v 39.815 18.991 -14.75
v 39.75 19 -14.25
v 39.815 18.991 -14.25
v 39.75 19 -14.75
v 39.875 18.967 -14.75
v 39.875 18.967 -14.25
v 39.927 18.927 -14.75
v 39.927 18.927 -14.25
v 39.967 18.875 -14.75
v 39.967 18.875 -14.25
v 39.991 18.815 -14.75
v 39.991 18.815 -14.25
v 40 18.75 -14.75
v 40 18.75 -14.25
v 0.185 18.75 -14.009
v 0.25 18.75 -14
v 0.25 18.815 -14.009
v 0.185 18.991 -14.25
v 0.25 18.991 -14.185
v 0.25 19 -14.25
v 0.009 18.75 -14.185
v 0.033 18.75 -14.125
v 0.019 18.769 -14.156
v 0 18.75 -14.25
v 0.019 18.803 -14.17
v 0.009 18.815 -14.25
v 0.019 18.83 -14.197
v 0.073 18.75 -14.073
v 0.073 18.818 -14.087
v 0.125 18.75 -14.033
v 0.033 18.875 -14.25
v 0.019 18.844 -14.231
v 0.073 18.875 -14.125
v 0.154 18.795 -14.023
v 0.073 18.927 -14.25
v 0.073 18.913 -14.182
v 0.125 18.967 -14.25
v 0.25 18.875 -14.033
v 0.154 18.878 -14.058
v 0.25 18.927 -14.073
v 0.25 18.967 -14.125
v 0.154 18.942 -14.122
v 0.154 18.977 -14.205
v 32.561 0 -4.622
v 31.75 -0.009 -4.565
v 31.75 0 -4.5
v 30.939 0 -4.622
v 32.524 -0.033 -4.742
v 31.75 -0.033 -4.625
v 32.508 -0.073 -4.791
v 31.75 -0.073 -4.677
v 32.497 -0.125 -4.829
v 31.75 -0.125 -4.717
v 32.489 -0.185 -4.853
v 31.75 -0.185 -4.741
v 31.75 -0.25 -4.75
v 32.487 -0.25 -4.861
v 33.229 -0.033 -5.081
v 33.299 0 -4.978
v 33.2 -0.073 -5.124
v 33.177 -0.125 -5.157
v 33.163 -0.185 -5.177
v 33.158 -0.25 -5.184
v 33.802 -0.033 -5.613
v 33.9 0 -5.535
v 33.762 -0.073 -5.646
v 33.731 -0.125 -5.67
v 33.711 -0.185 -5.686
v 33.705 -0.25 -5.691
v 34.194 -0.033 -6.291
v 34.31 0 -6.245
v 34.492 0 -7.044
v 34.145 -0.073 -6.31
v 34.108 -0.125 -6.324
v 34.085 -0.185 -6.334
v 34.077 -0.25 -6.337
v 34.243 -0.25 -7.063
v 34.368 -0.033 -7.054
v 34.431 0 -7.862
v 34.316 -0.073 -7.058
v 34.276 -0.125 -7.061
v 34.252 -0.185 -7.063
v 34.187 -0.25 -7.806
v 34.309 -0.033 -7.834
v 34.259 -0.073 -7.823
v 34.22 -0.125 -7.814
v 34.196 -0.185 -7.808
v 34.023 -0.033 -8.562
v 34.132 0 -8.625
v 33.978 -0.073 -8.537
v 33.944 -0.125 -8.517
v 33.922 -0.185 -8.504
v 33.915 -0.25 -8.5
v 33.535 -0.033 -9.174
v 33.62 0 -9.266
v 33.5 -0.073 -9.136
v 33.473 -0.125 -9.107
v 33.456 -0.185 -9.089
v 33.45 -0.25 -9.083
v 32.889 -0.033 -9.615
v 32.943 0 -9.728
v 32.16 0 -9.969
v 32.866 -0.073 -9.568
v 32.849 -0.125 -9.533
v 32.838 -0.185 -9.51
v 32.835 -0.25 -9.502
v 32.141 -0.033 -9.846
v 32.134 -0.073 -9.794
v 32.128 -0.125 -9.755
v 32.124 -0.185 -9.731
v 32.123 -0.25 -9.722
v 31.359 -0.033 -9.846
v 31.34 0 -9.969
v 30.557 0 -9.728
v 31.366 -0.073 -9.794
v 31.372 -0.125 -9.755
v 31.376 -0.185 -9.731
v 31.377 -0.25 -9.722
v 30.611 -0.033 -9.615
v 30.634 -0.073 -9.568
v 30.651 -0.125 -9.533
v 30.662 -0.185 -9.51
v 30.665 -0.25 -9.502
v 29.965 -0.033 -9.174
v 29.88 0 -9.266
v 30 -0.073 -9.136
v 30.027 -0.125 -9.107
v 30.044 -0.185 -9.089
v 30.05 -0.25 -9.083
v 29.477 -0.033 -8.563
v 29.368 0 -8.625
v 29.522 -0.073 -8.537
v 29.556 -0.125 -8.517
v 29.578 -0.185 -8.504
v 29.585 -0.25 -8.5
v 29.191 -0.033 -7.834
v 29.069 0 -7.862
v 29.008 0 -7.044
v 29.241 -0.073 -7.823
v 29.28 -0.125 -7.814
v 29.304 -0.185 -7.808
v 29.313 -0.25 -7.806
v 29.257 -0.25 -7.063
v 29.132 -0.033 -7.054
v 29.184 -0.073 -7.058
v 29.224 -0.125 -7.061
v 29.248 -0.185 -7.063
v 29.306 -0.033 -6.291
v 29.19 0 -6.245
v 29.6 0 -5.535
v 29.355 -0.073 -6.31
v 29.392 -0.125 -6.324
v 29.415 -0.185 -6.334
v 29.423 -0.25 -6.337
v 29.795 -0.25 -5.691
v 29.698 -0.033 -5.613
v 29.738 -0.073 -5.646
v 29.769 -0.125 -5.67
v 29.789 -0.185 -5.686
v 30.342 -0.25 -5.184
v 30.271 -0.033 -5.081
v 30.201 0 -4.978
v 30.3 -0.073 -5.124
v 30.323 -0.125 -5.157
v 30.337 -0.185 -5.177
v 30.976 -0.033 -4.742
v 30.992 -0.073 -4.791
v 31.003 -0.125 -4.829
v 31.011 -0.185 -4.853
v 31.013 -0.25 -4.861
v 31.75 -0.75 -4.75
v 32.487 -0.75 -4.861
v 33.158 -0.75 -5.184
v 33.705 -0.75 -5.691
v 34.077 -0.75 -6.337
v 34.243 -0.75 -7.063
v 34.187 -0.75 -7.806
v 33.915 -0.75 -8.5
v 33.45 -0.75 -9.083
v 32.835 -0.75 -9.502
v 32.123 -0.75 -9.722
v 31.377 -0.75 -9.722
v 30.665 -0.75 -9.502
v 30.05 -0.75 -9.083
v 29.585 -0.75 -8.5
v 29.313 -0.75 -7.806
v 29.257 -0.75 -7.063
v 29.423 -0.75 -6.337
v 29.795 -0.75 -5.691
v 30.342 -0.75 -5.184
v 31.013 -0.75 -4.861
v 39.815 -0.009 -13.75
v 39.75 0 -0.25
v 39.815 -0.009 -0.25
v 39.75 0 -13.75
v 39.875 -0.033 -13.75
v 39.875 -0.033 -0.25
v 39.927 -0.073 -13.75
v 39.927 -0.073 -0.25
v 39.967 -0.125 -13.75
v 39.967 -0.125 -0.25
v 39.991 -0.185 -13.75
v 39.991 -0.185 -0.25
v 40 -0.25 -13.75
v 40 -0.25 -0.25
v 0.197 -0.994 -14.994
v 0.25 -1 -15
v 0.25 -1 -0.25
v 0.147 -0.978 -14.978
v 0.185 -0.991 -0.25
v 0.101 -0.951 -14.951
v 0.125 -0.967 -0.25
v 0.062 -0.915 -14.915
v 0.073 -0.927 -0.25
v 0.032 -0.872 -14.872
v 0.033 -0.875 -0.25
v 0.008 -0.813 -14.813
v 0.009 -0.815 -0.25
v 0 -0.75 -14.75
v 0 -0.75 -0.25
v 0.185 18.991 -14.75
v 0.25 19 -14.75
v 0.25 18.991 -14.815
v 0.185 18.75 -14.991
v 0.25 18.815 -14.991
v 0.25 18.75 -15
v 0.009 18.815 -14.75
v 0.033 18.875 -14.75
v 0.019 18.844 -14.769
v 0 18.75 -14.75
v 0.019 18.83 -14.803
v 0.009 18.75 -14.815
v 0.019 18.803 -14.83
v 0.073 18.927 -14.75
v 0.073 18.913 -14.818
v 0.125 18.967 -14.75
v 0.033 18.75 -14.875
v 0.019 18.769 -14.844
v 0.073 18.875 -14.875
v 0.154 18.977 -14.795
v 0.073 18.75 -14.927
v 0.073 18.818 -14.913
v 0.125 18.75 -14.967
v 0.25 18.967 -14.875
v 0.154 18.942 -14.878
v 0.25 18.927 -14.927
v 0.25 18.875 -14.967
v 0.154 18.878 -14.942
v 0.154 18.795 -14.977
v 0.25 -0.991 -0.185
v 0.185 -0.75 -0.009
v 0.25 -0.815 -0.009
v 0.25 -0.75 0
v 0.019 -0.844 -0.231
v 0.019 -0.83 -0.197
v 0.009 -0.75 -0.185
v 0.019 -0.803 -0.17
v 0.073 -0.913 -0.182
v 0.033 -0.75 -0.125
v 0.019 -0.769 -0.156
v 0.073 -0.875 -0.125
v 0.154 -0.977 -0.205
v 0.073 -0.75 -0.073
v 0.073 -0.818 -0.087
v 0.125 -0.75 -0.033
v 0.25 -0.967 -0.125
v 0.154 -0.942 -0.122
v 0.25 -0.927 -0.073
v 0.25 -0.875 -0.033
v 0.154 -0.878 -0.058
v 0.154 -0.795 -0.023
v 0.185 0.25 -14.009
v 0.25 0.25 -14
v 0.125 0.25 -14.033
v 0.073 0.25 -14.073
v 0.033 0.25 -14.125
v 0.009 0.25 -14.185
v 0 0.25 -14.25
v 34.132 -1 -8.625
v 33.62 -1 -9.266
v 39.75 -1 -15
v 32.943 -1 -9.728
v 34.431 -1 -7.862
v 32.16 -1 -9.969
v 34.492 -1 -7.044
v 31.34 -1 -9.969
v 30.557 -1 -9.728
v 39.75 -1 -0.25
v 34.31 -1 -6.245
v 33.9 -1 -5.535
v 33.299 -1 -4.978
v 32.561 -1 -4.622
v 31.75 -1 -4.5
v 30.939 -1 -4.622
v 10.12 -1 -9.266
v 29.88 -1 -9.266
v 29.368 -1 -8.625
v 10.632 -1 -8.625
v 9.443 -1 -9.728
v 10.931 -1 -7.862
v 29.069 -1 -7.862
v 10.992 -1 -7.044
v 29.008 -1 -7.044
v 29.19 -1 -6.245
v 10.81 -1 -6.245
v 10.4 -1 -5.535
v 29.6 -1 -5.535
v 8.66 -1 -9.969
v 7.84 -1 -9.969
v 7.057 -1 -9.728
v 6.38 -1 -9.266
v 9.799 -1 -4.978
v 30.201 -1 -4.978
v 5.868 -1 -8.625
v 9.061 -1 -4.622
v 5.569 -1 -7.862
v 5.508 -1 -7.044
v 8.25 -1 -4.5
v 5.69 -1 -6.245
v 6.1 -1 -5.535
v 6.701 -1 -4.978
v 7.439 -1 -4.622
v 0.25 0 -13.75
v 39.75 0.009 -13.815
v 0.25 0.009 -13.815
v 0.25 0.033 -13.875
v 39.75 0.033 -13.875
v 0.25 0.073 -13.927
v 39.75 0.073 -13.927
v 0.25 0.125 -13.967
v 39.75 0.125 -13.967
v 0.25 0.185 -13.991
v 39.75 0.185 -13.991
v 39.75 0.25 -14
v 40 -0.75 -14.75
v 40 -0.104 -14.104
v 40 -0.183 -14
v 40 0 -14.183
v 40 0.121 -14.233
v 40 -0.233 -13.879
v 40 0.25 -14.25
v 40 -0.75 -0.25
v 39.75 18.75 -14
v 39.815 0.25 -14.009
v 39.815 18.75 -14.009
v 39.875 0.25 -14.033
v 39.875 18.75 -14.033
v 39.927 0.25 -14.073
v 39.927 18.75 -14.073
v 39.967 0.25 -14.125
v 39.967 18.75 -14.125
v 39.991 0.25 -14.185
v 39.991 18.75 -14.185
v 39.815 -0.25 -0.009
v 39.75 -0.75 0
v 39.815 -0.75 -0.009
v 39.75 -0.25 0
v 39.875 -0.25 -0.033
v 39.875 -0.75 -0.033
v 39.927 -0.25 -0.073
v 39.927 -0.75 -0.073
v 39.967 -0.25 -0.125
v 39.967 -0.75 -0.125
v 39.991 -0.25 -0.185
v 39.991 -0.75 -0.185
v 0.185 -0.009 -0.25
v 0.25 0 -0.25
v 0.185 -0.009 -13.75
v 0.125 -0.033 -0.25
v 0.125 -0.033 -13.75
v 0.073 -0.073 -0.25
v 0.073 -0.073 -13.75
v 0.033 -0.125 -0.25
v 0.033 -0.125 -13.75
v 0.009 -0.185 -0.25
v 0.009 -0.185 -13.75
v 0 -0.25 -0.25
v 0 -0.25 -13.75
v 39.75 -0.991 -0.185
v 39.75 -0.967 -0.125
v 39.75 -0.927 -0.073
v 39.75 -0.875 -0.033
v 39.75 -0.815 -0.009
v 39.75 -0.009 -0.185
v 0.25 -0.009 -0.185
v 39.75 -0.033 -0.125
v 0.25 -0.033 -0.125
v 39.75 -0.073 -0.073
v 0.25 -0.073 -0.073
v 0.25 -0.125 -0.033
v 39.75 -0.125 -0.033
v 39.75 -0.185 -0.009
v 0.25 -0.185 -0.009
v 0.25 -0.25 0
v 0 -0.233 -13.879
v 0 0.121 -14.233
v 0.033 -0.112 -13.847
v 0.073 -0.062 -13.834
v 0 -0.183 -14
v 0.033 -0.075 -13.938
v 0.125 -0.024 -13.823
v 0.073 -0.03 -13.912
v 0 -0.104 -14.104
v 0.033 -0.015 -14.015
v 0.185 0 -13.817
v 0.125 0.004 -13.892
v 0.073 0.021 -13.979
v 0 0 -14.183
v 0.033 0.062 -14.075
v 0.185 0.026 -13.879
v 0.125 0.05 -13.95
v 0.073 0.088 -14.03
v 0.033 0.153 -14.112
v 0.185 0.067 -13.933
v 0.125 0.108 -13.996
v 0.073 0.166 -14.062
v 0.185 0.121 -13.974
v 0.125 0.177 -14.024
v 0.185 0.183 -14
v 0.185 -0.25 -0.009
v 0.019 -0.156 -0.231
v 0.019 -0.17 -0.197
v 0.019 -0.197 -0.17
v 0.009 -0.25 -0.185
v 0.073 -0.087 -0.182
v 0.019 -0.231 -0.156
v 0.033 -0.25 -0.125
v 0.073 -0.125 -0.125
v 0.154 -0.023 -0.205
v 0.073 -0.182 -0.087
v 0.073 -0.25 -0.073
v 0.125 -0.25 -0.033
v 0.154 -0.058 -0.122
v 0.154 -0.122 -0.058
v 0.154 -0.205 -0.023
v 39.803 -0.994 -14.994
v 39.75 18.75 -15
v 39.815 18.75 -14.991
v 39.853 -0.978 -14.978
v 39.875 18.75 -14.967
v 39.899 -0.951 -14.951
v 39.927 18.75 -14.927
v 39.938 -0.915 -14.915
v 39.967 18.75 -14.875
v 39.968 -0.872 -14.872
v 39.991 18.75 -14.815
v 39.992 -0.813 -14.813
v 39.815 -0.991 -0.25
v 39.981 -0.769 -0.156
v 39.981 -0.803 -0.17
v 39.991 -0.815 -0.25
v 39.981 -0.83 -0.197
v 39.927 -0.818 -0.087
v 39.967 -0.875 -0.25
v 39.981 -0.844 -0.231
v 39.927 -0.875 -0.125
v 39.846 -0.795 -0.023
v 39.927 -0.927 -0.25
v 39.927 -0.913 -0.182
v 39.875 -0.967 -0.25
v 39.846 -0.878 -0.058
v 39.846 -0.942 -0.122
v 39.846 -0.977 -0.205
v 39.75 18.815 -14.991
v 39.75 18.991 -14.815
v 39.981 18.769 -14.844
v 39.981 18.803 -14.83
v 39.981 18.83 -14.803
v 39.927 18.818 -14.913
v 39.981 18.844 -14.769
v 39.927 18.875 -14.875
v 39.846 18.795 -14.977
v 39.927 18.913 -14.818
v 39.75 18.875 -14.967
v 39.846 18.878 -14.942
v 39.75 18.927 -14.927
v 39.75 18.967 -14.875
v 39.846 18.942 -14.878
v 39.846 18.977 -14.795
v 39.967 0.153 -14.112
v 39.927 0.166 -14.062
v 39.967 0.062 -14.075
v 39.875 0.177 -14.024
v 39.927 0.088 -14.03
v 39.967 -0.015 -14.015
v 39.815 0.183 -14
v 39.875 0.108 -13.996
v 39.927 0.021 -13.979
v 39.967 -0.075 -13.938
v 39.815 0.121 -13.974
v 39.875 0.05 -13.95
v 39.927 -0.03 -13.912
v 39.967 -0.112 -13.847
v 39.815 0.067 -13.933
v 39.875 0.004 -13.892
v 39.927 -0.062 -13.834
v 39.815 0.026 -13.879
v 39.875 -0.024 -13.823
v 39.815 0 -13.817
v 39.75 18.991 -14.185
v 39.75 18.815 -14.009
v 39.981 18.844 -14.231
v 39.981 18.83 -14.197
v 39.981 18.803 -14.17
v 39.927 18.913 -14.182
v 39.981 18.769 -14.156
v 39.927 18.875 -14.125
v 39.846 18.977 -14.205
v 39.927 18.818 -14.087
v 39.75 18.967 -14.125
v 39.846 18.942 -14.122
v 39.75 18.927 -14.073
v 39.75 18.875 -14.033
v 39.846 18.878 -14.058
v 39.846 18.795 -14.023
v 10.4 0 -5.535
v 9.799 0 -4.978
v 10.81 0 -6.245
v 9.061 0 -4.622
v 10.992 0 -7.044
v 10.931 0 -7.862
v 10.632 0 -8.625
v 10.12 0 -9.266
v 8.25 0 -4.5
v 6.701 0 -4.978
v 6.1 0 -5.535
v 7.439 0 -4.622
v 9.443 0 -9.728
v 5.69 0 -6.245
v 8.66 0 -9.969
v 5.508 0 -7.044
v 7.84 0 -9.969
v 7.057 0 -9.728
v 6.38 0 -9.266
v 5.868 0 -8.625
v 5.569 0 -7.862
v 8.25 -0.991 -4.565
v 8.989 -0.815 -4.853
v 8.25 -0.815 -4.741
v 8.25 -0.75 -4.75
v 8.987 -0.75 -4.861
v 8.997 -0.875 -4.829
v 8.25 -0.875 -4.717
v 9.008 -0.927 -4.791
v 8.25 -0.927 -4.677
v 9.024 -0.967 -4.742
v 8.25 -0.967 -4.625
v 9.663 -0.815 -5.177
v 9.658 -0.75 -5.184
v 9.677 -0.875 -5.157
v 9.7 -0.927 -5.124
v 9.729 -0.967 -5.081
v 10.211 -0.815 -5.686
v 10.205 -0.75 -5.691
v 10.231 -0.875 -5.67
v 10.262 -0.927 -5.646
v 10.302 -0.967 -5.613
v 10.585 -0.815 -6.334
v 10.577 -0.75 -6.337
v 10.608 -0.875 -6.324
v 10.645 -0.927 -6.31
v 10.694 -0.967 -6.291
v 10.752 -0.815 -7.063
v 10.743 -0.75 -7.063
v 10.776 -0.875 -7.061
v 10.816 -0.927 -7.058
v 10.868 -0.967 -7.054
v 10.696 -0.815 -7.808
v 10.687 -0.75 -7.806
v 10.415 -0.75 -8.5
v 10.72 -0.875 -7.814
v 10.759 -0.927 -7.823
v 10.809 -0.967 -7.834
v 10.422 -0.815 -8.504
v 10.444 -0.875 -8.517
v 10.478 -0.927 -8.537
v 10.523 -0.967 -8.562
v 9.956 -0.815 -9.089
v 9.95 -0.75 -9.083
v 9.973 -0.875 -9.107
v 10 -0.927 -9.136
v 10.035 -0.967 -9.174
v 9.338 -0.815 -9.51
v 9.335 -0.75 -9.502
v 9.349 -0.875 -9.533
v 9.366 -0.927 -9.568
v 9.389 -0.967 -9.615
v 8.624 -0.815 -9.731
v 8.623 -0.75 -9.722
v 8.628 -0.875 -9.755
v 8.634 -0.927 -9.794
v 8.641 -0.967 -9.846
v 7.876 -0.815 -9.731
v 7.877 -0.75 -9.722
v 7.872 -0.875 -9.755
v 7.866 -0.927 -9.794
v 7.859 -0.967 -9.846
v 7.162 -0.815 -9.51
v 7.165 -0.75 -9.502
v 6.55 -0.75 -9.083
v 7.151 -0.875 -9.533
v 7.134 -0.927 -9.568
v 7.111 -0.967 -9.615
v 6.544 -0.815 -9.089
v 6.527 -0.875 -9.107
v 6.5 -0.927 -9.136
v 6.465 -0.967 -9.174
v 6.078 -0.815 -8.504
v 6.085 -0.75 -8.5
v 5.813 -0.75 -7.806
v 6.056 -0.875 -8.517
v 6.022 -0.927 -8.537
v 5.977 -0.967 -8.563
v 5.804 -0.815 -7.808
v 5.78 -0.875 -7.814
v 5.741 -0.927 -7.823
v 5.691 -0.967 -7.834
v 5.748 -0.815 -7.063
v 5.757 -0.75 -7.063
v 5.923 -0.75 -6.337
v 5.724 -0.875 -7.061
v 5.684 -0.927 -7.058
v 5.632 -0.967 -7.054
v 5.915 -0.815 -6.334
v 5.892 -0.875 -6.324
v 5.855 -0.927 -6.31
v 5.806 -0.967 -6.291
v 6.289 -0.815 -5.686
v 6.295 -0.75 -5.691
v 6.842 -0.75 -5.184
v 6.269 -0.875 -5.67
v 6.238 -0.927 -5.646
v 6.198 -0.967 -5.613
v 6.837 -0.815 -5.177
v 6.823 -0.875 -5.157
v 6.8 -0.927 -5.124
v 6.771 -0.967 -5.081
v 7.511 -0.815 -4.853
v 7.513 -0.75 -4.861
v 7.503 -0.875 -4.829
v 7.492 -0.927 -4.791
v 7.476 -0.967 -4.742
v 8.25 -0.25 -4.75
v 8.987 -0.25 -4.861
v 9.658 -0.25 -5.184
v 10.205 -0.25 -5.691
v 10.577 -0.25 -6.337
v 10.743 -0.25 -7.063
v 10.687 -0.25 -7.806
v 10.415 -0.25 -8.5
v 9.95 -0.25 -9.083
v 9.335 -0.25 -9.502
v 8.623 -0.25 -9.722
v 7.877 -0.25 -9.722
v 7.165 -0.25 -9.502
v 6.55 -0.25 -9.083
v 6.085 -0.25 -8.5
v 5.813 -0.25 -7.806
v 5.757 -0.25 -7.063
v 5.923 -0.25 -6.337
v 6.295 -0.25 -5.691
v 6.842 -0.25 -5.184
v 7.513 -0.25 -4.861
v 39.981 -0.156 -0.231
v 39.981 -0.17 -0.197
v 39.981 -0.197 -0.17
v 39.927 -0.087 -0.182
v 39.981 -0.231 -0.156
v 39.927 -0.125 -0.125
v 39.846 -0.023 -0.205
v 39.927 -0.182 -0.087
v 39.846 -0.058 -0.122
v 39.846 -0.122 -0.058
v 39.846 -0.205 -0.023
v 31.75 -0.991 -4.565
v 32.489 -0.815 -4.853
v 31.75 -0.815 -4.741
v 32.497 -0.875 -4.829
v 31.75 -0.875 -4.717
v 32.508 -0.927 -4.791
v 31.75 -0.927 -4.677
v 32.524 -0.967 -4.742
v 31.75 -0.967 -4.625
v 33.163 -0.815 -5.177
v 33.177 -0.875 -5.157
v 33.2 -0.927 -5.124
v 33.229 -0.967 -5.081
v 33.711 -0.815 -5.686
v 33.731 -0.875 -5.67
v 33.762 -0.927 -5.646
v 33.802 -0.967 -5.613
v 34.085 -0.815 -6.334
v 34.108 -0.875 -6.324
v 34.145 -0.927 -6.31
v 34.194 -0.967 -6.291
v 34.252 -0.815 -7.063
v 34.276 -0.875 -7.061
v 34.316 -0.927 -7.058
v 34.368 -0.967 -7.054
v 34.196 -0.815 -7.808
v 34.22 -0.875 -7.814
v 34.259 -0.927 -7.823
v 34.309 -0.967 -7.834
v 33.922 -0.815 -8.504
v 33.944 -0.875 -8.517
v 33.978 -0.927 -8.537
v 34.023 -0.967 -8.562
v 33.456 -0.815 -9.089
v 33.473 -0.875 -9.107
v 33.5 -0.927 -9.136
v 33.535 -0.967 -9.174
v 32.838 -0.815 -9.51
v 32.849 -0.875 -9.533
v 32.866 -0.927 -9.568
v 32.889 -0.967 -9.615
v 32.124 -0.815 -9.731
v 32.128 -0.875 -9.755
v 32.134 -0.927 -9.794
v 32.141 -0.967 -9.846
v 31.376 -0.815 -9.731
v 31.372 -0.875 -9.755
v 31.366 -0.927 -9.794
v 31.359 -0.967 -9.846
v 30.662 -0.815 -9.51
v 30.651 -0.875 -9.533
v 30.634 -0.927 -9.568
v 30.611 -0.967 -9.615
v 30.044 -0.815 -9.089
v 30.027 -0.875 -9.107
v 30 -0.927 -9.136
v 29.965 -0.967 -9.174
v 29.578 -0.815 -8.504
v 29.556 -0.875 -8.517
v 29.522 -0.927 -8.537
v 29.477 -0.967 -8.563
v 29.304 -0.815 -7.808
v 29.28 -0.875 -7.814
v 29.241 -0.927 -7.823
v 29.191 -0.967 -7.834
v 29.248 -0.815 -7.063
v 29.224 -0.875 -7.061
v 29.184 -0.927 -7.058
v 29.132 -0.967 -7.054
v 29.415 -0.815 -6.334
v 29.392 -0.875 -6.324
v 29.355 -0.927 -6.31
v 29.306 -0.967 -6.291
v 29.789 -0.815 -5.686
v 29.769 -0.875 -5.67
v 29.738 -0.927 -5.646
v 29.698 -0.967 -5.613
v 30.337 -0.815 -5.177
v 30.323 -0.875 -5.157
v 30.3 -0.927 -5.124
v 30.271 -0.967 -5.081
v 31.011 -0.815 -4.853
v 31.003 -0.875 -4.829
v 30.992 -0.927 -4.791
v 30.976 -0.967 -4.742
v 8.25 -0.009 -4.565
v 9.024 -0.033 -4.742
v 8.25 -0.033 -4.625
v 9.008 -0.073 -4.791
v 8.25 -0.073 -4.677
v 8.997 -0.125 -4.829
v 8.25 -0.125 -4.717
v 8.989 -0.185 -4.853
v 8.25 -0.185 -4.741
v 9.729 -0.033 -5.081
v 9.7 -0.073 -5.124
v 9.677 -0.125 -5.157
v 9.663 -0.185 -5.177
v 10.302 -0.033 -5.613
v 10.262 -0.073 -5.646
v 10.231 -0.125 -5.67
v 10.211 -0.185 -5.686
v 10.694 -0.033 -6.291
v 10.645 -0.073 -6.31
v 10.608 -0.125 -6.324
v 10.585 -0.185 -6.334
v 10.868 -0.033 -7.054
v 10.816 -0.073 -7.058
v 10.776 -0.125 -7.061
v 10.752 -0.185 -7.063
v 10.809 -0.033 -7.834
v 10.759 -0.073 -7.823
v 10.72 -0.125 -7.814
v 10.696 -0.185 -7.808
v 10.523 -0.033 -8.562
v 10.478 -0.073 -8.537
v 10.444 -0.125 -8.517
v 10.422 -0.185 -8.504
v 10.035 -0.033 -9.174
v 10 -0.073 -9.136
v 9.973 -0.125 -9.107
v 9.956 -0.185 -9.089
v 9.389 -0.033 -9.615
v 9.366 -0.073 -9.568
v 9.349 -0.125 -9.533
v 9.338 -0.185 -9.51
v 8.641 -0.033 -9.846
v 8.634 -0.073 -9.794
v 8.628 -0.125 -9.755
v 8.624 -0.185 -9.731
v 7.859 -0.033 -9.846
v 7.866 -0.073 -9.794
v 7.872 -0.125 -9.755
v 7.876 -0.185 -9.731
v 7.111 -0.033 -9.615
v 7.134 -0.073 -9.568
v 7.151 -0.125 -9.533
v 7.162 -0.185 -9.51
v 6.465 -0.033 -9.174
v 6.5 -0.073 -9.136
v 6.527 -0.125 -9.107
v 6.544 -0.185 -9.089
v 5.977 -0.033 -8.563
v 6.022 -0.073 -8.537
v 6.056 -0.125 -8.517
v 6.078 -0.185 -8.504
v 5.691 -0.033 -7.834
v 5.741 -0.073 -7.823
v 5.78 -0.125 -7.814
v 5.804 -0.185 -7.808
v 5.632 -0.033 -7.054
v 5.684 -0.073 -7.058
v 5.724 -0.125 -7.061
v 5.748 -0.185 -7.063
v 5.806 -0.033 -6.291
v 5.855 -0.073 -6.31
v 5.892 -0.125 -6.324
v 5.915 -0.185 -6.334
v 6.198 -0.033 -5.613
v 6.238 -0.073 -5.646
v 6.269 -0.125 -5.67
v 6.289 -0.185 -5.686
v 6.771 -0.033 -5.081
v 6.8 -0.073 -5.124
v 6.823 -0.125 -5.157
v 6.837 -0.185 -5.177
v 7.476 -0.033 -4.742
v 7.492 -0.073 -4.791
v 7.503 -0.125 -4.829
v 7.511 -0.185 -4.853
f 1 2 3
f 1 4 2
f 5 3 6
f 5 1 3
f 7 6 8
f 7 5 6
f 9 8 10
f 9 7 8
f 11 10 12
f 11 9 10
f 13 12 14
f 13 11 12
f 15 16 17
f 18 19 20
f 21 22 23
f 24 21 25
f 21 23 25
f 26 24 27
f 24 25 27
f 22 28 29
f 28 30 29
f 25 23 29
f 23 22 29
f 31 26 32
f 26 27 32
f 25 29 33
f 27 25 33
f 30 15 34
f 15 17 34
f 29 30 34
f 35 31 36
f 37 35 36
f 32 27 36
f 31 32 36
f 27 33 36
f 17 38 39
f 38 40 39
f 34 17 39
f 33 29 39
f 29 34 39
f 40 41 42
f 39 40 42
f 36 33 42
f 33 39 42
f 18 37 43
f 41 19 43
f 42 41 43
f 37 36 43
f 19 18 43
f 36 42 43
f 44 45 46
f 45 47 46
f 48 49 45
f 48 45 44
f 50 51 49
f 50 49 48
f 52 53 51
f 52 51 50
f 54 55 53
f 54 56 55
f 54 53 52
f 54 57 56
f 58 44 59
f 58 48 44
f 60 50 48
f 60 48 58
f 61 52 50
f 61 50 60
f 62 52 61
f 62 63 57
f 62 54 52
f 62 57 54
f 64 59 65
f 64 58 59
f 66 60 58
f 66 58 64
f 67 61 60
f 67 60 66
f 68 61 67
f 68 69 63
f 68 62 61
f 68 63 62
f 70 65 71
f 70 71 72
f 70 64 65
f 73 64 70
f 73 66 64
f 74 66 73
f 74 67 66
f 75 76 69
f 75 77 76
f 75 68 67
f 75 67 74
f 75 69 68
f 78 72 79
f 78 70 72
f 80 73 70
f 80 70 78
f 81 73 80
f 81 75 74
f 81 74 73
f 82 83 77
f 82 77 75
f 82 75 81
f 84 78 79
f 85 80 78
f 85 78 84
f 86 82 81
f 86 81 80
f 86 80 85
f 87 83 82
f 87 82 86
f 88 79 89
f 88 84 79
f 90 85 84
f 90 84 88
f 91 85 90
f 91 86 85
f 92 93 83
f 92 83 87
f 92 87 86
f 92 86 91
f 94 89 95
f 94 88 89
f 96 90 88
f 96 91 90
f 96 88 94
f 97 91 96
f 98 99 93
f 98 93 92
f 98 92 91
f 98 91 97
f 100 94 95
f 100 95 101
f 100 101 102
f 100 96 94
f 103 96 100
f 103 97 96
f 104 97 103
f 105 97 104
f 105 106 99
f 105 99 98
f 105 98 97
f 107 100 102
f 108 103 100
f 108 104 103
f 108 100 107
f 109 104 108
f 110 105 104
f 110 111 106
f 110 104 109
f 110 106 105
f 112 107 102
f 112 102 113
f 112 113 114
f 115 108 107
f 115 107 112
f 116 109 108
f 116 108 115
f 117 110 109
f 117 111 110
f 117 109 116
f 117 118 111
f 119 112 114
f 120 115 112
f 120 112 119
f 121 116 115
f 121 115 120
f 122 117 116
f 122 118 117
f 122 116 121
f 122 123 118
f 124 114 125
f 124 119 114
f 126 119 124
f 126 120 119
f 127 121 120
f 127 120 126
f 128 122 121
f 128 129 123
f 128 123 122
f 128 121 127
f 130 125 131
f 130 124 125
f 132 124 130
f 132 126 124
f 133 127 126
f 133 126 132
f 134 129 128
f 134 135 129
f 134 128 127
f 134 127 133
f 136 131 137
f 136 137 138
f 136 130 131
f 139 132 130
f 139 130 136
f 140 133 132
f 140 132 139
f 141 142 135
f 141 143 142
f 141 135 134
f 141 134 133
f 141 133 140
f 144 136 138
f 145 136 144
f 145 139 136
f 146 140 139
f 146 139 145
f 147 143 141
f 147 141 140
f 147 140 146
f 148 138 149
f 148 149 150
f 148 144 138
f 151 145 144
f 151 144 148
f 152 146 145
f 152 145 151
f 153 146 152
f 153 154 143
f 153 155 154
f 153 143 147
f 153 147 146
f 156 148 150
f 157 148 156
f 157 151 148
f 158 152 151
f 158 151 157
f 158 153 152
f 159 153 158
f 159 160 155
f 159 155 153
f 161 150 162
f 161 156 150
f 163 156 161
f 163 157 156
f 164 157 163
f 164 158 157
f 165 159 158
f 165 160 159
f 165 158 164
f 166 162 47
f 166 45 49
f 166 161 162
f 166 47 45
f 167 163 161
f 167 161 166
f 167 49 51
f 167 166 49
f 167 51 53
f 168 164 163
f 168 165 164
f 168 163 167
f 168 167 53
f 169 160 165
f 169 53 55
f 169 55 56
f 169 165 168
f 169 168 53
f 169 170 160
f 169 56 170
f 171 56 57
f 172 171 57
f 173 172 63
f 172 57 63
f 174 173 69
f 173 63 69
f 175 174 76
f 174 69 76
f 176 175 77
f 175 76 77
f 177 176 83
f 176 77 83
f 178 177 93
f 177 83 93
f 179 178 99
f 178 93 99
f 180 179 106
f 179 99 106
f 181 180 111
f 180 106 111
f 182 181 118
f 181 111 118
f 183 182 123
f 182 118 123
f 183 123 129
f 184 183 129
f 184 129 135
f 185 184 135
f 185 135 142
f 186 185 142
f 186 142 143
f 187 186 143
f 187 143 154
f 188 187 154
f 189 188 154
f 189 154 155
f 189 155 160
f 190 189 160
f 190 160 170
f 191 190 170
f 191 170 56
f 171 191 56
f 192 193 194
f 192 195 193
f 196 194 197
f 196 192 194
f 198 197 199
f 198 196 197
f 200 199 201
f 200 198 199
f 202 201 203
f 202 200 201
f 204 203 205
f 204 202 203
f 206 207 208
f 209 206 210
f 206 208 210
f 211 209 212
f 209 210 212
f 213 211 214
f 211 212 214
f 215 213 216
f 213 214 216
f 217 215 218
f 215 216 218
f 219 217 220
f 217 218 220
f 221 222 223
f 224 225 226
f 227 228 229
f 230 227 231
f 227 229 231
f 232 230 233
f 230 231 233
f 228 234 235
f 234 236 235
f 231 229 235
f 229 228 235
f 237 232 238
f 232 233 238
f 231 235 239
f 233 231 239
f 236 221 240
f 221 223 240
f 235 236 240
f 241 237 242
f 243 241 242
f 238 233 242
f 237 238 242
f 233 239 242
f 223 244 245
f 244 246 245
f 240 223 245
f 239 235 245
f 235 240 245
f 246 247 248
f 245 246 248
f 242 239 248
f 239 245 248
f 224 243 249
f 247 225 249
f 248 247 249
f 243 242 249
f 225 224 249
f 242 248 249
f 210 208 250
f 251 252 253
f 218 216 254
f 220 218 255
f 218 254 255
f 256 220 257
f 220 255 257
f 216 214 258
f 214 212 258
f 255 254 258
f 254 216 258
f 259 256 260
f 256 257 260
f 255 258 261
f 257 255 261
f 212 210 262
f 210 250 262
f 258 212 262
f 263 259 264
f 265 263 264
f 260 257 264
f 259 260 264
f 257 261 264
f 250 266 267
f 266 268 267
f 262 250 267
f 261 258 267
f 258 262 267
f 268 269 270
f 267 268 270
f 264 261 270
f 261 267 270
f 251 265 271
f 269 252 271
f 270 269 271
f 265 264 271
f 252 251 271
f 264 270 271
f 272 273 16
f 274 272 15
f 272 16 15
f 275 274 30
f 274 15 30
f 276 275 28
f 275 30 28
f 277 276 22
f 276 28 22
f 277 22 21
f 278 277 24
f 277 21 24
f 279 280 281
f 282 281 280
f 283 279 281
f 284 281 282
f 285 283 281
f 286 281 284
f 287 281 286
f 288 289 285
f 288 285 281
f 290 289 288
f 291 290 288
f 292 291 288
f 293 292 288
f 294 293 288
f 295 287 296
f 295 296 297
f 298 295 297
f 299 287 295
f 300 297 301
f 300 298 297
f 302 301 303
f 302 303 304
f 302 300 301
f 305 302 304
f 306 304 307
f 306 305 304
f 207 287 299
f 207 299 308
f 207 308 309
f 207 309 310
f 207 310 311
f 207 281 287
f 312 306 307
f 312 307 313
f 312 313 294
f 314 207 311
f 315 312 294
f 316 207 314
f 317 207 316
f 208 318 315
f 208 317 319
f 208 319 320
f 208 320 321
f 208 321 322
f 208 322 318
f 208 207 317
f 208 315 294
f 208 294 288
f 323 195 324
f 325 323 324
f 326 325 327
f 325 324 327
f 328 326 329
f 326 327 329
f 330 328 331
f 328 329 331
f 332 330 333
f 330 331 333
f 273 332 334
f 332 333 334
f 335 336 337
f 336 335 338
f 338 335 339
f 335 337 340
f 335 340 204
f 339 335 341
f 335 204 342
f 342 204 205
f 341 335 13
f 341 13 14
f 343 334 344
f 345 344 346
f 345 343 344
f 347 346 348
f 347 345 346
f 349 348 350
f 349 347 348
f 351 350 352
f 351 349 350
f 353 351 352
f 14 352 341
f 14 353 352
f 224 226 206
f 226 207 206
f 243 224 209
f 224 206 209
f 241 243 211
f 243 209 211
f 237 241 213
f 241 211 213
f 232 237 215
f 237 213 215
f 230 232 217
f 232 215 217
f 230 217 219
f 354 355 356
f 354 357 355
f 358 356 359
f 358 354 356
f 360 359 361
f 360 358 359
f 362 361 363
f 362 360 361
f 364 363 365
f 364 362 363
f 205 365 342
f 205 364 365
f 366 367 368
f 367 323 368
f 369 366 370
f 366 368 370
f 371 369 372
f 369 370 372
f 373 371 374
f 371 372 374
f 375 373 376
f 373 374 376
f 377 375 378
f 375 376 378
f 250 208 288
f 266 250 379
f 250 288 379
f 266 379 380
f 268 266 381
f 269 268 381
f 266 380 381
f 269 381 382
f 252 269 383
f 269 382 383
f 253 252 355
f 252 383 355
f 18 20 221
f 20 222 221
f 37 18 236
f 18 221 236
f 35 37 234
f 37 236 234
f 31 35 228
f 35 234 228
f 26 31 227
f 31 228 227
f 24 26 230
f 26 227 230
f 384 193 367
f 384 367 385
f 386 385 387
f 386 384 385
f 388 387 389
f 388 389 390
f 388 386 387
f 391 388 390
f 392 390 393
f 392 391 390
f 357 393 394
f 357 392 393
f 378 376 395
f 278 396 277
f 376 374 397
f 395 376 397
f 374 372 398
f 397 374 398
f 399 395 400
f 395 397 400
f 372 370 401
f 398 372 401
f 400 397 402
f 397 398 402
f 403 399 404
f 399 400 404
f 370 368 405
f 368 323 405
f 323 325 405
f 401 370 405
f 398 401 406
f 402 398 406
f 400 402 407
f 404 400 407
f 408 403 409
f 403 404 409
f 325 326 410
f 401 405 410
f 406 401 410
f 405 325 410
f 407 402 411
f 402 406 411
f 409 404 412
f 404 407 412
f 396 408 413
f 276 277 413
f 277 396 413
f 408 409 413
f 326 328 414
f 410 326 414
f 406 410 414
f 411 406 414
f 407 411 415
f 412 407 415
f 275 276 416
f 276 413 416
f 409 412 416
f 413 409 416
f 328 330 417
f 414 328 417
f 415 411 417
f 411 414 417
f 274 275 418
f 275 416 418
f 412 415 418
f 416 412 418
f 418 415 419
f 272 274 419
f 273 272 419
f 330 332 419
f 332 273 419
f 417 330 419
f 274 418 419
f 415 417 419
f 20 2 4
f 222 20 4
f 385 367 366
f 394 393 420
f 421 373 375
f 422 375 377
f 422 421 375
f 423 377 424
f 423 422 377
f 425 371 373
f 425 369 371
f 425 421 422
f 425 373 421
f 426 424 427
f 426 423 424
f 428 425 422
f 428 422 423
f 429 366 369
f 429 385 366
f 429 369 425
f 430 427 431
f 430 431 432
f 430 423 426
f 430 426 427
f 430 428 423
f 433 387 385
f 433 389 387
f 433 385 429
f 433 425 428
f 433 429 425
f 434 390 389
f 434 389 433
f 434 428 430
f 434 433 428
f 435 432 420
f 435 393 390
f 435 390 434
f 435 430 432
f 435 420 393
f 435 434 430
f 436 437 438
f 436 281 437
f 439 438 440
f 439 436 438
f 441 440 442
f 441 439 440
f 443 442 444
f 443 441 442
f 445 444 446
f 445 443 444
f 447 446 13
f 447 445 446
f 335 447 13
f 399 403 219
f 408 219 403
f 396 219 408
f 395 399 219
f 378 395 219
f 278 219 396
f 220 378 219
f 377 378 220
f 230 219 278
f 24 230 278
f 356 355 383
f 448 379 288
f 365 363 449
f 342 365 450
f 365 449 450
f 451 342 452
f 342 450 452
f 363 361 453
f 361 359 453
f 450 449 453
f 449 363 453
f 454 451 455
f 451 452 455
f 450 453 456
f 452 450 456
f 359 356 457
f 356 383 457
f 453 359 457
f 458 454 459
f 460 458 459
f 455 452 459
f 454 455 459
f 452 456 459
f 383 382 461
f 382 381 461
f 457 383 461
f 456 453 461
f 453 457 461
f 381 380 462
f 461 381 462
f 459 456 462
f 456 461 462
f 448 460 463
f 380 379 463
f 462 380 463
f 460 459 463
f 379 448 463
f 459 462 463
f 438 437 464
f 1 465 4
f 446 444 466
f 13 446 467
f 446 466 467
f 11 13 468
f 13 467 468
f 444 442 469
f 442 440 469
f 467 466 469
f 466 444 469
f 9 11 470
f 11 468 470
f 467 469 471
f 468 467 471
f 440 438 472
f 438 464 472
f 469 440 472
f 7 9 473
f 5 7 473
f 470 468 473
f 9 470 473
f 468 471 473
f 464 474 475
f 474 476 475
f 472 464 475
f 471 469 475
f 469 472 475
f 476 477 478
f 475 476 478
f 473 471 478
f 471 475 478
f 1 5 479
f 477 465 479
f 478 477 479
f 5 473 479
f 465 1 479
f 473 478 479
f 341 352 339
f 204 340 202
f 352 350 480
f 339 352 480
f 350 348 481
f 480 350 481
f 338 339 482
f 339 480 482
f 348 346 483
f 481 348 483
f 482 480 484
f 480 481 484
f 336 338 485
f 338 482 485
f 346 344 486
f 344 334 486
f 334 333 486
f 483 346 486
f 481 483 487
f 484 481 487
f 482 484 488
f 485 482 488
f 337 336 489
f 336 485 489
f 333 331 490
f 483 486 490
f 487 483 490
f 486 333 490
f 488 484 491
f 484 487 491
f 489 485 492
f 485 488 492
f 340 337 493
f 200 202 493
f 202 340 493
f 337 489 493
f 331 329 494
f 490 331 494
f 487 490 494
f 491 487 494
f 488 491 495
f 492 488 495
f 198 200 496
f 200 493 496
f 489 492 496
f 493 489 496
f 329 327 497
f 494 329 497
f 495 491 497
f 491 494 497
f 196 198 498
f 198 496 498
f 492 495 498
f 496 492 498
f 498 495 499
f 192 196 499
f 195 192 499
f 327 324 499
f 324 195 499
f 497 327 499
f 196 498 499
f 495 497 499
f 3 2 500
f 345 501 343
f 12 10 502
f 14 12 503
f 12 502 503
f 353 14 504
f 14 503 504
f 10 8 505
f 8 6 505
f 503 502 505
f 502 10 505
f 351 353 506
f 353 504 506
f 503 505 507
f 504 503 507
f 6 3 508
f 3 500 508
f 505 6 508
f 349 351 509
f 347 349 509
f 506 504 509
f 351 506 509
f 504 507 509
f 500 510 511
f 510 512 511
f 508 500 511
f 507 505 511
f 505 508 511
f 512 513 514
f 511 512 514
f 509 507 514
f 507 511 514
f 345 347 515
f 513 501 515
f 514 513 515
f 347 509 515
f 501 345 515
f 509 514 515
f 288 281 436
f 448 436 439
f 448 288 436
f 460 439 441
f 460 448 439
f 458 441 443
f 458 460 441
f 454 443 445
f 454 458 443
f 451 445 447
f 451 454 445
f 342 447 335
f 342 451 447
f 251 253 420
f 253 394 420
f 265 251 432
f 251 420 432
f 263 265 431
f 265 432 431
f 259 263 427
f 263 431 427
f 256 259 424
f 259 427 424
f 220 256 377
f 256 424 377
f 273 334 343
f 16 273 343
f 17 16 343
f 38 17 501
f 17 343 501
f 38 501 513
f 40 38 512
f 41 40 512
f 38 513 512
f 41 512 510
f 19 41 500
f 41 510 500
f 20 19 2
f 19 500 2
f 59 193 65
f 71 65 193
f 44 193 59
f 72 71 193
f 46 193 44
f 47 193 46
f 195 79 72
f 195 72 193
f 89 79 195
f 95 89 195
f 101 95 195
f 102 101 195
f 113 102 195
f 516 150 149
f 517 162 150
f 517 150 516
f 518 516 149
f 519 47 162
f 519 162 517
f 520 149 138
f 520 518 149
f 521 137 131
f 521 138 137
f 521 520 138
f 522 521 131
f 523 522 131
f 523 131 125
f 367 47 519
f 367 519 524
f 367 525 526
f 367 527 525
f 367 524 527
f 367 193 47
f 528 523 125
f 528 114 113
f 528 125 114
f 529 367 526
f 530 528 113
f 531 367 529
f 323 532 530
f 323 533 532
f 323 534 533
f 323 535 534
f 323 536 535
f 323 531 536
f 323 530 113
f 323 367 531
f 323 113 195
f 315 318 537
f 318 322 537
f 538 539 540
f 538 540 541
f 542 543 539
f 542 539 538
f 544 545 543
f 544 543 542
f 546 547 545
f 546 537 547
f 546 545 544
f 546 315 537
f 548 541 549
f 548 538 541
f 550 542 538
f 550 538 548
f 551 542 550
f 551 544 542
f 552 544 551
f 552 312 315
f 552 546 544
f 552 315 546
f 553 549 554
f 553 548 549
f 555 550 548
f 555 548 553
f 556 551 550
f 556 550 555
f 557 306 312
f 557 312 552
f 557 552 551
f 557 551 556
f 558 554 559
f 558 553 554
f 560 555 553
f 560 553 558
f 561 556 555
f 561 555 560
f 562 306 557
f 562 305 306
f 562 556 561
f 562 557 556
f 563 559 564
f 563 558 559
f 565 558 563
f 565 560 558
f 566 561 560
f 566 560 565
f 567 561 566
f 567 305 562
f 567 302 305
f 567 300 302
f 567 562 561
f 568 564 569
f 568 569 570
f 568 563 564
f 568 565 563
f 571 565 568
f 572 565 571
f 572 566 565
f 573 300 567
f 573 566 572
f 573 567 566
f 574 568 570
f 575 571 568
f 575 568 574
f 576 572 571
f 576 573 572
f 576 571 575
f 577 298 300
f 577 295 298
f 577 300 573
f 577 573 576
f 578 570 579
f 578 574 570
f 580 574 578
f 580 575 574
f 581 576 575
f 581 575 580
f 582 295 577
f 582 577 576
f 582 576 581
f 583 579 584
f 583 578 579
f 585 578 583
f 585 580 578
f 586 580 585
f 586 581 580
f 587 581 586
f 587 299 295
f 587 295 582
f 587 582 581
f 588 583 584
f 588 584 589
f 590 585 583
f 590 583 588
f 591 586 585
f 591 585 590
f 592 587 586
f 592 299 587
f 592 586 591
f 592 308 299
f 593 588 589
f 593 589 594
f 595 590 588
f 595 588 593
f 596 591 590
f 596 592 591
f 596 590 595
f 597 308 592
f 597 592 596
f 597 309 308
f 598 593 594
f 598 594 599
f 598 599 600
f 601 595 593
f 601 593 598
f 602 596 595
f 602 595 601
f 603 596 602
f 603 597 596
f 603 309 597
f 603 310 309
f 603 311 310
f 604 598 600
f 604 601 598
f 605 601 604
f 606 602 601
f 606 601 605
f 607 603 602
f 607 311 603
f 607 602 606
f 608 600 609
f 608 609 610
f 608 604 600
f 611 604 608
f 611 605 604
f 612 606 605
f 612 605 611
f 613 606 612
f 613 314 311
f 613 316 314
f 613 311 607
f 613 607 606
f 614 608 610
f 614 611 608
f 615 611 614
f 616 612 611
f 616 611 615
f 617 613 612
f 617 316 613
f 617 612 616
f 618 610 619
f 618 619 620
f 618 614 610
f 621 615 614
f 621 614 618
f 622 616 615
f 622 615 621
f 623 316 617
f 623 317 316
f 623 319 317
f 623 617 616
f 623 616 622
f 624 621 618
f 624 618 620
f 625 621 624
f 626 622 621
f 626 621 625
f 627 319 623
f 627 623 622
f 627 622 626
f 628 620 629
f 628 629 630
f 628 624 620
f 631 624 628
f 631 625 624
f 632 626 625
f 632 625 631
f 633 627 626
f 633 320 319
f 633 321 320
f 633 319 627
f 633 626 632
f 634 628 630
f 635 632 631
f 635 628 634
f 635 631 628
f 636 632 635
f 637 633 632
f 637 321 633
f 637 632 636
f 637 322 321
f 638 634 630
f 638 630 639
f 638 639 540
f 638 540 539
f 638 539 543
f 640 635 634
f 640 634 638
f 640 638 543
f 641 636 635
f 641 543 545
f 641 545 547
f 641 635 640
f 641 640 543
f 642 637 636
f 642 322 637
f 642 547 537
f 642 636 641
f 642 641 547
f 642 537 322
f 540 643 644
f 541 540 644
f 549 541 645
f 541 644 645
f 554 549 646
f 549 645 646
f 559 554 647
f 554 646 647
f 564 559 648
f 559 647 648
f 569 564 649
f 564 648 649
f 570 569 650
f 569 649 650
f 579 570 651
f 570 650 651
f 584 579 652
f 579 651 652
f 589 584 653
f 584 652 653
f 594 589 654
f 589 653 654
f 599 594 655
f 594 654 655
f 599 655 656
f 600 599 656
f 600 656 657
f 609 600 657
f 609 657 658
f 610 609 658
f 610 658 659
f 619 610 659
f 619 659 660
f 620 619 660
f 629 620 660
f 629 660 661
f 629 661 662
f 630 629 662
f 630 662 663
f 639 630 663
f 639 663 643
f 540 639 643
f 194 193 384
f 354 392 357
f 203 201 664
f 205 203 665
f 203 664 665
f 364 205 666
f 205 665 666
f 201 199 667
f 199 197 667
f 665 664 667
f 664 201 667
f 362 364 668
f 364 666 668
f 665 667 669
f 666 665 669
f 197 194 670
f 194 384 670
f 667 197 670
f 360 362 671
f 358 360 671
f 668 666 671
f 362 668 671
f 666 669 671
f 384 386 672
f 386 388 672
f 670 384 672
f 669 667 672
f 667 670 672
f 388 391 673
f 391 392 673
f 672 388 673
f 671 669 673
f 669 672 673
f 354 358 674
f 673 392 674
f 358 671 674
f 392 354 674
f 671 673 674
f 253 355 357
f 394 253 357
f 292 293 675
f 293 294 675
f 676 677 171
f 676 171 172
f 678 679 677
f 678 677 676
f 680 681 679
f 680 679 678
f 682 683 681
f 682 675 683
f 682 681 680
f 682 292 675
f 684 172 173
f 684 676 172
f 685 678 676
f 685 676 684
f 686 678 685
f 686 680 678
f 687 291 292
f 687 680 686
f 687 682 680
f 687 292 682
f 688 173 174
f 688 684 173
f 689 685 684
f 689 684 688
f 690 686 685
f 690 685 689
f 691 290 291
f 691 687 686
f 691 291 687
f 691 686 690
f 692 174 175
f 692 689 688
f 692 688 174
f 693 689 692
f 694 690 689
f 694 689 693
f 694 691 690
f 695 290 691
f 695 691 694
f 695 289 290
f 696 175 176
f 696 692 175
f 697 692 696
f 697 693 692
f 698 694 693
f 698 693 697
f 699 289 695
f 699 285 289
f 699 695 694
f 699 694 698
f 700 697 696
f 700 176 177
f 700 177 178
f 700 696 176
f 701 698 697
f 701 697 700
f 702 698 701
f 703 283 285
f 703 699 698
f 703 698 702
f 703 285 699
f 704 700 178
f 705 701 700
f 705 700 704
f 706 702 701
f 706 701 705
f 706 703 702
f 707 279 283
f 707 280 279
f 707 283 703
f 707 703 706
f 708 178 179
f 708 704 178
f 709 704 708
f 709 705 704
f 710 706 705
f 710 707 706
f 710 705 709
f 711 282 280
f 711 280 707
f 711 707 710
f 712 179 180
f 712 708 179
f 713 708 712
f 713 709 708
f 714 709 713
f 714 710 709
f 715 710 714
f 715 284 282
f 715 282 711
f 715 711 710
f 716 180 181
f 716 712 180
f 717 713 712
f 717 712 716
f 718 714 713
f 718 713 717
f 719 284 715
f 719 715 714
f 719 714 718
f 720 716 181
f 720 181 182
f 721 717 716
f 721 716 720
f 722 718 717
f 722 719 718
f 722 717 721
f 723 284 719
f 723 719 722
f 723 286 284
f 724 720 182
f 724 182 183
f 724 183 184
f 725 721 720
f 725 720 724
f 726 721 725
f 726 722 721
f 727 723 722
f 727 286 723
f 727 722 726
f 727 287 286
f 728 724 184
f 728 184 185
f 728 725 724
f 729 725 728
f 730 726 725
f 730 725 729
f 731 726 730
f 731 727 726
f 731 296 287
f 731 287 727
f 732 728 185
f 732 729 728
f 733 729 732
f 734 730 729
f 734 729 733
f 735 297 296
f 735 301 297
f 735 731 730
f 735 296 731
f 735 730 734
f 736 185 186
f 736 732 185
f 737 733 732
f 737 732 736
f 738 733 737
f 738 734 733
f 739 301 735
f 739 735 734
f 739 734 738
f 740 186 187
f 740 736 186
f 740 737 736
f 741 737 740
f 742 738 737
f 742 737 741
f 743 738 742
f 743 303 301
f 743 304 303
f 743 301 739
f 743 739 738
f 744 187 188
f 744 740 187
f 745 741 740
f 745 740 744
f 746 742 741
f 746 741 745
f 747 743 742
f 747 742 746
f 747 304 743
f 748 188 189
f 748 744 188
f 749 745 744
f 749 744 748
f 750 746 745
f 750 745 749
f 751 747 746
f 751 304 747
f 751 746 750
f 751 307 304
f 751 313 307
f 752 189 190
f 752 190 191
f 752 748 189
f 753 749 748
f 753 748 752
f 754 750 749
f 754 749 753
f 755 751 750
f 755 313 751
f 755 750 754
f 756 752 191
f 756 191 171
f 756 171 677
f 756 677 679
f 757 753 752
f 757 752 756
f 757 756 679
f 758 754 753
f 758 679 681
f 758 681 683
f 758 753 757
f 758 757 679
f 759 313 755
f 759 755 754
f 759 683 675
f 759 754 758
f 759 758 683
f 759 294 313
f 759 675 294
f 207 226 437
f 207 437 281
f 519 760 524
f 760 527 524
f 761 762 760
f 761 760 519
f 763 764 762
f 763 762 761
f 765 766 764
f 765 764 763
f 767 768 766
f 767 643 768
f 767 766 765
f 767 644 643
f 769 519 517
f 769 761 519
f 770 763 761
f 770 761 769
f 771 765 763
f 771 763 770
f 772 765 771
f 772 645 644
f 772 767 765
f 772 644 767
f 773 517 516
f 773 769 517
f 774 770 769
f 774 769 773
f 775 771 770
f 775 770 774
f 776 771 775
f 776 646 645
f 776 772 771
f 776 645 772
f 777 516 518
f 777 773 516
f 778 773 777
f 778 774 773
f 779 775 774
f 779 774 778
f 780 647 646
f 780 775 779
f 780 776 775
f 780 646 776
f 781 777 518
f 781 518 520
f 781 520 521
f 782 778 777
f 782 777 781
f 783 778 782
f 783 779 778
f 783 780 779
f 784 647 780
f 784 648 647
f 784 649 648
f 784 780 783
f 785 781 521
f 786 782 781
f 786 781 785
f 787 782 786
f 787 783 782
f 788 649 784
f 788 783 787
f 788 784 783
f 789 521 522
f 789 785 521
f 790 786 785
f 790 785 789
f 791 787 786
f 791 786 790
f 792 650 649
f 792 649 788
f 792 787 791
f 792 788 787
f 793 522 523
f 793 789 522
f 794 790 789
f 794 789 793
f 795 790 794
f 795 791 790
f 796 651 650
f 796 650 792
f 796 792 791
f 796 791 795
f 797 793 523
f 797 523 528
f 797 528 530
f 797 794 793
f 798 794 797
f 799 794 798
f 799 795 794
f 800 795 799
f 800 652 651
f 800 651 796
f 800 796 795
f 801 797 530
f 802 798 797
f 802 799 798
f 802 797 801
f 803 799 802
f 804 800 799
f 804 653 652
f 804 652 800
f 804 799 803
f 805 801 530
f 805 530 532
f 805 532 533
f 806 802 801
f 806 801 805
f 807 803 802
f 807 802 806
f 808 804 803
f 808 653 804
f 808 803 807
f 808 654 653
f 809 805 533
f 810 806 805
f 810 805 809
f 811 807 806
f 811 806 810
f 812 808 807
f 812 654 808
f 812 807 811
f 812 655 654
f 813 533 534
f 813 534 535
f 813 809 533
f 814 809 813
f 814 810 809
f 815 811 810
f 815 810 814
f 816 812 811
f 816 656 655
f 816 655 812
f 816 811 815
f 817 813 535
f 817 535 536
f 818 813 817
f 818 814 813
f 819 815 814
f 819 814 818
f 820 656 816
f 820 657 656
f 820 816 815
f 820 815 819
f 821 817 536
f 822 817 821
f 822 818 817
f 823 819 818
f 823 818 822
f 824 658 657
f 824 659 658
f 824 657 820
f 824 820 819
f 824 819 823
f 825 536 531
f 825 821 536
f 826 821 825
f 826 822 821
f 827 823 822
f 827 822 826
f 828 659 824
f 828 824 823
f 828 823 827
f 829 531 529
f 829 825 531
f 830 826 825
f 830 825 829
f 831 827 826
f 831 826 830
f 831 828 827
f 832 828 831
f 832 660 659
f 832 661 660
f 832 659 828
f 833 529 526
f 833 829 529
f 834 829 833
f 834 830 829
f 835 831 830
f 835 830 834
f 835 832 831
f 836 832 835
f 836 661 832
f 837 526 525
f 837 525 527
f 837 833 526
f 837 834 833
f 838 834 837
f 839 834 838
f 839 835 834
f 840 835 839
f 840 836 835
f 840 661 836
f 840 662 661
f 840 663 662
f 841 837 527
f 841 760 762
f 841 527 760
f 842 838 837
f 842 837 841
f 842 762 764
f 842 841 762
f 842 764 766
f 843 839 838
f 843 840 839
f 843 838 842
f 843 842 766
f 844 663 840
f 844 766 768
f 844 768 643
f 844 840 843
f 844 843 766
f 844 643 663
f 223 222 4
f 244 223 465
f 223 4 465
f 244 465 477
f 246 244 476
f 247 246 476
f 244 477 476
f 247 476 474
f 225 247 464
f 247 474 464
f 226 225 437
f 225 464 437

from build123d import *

# Parameters (mm, degrees)
BOSS_EXTRUDE1_DEPTH = 40
FILLET1_R           = 0.25
CUT_EXTRUDE1_REACH  = 48.755
SKETCH2_R           = 2.5
FILLET2_R           = 0.25


with BuildPart() as part:
    # Sketch1 → Boss-Extrude1 (new body)
    with BuildSketch(Plane(origin=(0, 0, 0), x_dir=(0, 0, -1), z_dir=(1, 0, 0))):
        Polygon((0, 0), (14, 0), (14, 19), (15, 19), (15, -1), (0, -1), align=None)
    extrude(amount=BOSS_EXTRUDE1_DEPTH)

    # Fillet1
    fillet1_edges = [part.edges().sort_by_distance(p)[0] for p in [
        (20, 0, 0),
        (20, 0, -14),
        (20, 19, -14),
        (20, 19, -15),
        (20, -1, 0),
        (40, 9, -15),
        (40, 19, -14.5),
        (40, 9.5, -14),
        (40, 0, -7),
        (40, -0.5, 0),
        (0, 0, -7),
        (0, 9.5, -14),
        (0, 19, -14.5),
        (0, 9, -15),
        (0, -1, -7.5),
        (0, -0.5, 0),
        (40, -1, -7.5),
    ]]
    fillet(fillet1_edges, radius=FILLET1_R)

    # Sketch2 → Cut-Extrude1 (cut, up to next)
    with BuildSketch(Plane(origin=(0, 0, 0), x_dir=(1, 0, 0), z_dir=(0, 1, 0)), mode=Mode.PRIVATE) as cut_extrude1_sk1:
        with Locations(Location((8.25, 7.25, 0), (0, 0, 270))):
            Circle(SKETCH2_R)
    cut_extrude1_tool1 = extrude(cut_extrude1_sk1.sketch, amount=-CUT_EXTRUDE1_REACH, mode=Mode.PRIVATE) & part.part
    # Sketch2 → Cut-Extrude1 (cut, up to next)
    with BuildSketch(Plane(origin=(0, 0, 0), x_dir=(1, 0, 0), z_dir=(0, 1, 0)), mode=Mode.PRIVATE) as cut_extrude1_sk2:
        with Locations(Location((31.75, 7.25, 0), (0, 0, 270))):
            Circle(SKETCH2_R)
    cut_extrude1_tool2 = extrude(cut_extrude1_sk2.sketch, amount=-CUT_EXTRUDE1_REACH, mode=Mode.PRIVATE) & part.part
    add(cut_extrude1_tool1.solids().sort_by_distance((8.25, 0, -7.25))[0], mode=Mode.SUBTRACT)
    add(cut_extrude1_tool2.solids().sort_by_distance((31.75, 0, -7.25))[0], mode=Mode.SUBTRACT)

    # Fillet2
    fillet2_edges = [part.edges().sort_by_distance(p)[0] for p in [
        (8.25, 0, -9.75),
        (8.25, -1, -9.75),
        (31.75, 0, -9.75),
        (31.75, -1, -9.75),
    ]]
    fillet(fillet2_edges, radius=FILLET2_R)


solid = part.part
